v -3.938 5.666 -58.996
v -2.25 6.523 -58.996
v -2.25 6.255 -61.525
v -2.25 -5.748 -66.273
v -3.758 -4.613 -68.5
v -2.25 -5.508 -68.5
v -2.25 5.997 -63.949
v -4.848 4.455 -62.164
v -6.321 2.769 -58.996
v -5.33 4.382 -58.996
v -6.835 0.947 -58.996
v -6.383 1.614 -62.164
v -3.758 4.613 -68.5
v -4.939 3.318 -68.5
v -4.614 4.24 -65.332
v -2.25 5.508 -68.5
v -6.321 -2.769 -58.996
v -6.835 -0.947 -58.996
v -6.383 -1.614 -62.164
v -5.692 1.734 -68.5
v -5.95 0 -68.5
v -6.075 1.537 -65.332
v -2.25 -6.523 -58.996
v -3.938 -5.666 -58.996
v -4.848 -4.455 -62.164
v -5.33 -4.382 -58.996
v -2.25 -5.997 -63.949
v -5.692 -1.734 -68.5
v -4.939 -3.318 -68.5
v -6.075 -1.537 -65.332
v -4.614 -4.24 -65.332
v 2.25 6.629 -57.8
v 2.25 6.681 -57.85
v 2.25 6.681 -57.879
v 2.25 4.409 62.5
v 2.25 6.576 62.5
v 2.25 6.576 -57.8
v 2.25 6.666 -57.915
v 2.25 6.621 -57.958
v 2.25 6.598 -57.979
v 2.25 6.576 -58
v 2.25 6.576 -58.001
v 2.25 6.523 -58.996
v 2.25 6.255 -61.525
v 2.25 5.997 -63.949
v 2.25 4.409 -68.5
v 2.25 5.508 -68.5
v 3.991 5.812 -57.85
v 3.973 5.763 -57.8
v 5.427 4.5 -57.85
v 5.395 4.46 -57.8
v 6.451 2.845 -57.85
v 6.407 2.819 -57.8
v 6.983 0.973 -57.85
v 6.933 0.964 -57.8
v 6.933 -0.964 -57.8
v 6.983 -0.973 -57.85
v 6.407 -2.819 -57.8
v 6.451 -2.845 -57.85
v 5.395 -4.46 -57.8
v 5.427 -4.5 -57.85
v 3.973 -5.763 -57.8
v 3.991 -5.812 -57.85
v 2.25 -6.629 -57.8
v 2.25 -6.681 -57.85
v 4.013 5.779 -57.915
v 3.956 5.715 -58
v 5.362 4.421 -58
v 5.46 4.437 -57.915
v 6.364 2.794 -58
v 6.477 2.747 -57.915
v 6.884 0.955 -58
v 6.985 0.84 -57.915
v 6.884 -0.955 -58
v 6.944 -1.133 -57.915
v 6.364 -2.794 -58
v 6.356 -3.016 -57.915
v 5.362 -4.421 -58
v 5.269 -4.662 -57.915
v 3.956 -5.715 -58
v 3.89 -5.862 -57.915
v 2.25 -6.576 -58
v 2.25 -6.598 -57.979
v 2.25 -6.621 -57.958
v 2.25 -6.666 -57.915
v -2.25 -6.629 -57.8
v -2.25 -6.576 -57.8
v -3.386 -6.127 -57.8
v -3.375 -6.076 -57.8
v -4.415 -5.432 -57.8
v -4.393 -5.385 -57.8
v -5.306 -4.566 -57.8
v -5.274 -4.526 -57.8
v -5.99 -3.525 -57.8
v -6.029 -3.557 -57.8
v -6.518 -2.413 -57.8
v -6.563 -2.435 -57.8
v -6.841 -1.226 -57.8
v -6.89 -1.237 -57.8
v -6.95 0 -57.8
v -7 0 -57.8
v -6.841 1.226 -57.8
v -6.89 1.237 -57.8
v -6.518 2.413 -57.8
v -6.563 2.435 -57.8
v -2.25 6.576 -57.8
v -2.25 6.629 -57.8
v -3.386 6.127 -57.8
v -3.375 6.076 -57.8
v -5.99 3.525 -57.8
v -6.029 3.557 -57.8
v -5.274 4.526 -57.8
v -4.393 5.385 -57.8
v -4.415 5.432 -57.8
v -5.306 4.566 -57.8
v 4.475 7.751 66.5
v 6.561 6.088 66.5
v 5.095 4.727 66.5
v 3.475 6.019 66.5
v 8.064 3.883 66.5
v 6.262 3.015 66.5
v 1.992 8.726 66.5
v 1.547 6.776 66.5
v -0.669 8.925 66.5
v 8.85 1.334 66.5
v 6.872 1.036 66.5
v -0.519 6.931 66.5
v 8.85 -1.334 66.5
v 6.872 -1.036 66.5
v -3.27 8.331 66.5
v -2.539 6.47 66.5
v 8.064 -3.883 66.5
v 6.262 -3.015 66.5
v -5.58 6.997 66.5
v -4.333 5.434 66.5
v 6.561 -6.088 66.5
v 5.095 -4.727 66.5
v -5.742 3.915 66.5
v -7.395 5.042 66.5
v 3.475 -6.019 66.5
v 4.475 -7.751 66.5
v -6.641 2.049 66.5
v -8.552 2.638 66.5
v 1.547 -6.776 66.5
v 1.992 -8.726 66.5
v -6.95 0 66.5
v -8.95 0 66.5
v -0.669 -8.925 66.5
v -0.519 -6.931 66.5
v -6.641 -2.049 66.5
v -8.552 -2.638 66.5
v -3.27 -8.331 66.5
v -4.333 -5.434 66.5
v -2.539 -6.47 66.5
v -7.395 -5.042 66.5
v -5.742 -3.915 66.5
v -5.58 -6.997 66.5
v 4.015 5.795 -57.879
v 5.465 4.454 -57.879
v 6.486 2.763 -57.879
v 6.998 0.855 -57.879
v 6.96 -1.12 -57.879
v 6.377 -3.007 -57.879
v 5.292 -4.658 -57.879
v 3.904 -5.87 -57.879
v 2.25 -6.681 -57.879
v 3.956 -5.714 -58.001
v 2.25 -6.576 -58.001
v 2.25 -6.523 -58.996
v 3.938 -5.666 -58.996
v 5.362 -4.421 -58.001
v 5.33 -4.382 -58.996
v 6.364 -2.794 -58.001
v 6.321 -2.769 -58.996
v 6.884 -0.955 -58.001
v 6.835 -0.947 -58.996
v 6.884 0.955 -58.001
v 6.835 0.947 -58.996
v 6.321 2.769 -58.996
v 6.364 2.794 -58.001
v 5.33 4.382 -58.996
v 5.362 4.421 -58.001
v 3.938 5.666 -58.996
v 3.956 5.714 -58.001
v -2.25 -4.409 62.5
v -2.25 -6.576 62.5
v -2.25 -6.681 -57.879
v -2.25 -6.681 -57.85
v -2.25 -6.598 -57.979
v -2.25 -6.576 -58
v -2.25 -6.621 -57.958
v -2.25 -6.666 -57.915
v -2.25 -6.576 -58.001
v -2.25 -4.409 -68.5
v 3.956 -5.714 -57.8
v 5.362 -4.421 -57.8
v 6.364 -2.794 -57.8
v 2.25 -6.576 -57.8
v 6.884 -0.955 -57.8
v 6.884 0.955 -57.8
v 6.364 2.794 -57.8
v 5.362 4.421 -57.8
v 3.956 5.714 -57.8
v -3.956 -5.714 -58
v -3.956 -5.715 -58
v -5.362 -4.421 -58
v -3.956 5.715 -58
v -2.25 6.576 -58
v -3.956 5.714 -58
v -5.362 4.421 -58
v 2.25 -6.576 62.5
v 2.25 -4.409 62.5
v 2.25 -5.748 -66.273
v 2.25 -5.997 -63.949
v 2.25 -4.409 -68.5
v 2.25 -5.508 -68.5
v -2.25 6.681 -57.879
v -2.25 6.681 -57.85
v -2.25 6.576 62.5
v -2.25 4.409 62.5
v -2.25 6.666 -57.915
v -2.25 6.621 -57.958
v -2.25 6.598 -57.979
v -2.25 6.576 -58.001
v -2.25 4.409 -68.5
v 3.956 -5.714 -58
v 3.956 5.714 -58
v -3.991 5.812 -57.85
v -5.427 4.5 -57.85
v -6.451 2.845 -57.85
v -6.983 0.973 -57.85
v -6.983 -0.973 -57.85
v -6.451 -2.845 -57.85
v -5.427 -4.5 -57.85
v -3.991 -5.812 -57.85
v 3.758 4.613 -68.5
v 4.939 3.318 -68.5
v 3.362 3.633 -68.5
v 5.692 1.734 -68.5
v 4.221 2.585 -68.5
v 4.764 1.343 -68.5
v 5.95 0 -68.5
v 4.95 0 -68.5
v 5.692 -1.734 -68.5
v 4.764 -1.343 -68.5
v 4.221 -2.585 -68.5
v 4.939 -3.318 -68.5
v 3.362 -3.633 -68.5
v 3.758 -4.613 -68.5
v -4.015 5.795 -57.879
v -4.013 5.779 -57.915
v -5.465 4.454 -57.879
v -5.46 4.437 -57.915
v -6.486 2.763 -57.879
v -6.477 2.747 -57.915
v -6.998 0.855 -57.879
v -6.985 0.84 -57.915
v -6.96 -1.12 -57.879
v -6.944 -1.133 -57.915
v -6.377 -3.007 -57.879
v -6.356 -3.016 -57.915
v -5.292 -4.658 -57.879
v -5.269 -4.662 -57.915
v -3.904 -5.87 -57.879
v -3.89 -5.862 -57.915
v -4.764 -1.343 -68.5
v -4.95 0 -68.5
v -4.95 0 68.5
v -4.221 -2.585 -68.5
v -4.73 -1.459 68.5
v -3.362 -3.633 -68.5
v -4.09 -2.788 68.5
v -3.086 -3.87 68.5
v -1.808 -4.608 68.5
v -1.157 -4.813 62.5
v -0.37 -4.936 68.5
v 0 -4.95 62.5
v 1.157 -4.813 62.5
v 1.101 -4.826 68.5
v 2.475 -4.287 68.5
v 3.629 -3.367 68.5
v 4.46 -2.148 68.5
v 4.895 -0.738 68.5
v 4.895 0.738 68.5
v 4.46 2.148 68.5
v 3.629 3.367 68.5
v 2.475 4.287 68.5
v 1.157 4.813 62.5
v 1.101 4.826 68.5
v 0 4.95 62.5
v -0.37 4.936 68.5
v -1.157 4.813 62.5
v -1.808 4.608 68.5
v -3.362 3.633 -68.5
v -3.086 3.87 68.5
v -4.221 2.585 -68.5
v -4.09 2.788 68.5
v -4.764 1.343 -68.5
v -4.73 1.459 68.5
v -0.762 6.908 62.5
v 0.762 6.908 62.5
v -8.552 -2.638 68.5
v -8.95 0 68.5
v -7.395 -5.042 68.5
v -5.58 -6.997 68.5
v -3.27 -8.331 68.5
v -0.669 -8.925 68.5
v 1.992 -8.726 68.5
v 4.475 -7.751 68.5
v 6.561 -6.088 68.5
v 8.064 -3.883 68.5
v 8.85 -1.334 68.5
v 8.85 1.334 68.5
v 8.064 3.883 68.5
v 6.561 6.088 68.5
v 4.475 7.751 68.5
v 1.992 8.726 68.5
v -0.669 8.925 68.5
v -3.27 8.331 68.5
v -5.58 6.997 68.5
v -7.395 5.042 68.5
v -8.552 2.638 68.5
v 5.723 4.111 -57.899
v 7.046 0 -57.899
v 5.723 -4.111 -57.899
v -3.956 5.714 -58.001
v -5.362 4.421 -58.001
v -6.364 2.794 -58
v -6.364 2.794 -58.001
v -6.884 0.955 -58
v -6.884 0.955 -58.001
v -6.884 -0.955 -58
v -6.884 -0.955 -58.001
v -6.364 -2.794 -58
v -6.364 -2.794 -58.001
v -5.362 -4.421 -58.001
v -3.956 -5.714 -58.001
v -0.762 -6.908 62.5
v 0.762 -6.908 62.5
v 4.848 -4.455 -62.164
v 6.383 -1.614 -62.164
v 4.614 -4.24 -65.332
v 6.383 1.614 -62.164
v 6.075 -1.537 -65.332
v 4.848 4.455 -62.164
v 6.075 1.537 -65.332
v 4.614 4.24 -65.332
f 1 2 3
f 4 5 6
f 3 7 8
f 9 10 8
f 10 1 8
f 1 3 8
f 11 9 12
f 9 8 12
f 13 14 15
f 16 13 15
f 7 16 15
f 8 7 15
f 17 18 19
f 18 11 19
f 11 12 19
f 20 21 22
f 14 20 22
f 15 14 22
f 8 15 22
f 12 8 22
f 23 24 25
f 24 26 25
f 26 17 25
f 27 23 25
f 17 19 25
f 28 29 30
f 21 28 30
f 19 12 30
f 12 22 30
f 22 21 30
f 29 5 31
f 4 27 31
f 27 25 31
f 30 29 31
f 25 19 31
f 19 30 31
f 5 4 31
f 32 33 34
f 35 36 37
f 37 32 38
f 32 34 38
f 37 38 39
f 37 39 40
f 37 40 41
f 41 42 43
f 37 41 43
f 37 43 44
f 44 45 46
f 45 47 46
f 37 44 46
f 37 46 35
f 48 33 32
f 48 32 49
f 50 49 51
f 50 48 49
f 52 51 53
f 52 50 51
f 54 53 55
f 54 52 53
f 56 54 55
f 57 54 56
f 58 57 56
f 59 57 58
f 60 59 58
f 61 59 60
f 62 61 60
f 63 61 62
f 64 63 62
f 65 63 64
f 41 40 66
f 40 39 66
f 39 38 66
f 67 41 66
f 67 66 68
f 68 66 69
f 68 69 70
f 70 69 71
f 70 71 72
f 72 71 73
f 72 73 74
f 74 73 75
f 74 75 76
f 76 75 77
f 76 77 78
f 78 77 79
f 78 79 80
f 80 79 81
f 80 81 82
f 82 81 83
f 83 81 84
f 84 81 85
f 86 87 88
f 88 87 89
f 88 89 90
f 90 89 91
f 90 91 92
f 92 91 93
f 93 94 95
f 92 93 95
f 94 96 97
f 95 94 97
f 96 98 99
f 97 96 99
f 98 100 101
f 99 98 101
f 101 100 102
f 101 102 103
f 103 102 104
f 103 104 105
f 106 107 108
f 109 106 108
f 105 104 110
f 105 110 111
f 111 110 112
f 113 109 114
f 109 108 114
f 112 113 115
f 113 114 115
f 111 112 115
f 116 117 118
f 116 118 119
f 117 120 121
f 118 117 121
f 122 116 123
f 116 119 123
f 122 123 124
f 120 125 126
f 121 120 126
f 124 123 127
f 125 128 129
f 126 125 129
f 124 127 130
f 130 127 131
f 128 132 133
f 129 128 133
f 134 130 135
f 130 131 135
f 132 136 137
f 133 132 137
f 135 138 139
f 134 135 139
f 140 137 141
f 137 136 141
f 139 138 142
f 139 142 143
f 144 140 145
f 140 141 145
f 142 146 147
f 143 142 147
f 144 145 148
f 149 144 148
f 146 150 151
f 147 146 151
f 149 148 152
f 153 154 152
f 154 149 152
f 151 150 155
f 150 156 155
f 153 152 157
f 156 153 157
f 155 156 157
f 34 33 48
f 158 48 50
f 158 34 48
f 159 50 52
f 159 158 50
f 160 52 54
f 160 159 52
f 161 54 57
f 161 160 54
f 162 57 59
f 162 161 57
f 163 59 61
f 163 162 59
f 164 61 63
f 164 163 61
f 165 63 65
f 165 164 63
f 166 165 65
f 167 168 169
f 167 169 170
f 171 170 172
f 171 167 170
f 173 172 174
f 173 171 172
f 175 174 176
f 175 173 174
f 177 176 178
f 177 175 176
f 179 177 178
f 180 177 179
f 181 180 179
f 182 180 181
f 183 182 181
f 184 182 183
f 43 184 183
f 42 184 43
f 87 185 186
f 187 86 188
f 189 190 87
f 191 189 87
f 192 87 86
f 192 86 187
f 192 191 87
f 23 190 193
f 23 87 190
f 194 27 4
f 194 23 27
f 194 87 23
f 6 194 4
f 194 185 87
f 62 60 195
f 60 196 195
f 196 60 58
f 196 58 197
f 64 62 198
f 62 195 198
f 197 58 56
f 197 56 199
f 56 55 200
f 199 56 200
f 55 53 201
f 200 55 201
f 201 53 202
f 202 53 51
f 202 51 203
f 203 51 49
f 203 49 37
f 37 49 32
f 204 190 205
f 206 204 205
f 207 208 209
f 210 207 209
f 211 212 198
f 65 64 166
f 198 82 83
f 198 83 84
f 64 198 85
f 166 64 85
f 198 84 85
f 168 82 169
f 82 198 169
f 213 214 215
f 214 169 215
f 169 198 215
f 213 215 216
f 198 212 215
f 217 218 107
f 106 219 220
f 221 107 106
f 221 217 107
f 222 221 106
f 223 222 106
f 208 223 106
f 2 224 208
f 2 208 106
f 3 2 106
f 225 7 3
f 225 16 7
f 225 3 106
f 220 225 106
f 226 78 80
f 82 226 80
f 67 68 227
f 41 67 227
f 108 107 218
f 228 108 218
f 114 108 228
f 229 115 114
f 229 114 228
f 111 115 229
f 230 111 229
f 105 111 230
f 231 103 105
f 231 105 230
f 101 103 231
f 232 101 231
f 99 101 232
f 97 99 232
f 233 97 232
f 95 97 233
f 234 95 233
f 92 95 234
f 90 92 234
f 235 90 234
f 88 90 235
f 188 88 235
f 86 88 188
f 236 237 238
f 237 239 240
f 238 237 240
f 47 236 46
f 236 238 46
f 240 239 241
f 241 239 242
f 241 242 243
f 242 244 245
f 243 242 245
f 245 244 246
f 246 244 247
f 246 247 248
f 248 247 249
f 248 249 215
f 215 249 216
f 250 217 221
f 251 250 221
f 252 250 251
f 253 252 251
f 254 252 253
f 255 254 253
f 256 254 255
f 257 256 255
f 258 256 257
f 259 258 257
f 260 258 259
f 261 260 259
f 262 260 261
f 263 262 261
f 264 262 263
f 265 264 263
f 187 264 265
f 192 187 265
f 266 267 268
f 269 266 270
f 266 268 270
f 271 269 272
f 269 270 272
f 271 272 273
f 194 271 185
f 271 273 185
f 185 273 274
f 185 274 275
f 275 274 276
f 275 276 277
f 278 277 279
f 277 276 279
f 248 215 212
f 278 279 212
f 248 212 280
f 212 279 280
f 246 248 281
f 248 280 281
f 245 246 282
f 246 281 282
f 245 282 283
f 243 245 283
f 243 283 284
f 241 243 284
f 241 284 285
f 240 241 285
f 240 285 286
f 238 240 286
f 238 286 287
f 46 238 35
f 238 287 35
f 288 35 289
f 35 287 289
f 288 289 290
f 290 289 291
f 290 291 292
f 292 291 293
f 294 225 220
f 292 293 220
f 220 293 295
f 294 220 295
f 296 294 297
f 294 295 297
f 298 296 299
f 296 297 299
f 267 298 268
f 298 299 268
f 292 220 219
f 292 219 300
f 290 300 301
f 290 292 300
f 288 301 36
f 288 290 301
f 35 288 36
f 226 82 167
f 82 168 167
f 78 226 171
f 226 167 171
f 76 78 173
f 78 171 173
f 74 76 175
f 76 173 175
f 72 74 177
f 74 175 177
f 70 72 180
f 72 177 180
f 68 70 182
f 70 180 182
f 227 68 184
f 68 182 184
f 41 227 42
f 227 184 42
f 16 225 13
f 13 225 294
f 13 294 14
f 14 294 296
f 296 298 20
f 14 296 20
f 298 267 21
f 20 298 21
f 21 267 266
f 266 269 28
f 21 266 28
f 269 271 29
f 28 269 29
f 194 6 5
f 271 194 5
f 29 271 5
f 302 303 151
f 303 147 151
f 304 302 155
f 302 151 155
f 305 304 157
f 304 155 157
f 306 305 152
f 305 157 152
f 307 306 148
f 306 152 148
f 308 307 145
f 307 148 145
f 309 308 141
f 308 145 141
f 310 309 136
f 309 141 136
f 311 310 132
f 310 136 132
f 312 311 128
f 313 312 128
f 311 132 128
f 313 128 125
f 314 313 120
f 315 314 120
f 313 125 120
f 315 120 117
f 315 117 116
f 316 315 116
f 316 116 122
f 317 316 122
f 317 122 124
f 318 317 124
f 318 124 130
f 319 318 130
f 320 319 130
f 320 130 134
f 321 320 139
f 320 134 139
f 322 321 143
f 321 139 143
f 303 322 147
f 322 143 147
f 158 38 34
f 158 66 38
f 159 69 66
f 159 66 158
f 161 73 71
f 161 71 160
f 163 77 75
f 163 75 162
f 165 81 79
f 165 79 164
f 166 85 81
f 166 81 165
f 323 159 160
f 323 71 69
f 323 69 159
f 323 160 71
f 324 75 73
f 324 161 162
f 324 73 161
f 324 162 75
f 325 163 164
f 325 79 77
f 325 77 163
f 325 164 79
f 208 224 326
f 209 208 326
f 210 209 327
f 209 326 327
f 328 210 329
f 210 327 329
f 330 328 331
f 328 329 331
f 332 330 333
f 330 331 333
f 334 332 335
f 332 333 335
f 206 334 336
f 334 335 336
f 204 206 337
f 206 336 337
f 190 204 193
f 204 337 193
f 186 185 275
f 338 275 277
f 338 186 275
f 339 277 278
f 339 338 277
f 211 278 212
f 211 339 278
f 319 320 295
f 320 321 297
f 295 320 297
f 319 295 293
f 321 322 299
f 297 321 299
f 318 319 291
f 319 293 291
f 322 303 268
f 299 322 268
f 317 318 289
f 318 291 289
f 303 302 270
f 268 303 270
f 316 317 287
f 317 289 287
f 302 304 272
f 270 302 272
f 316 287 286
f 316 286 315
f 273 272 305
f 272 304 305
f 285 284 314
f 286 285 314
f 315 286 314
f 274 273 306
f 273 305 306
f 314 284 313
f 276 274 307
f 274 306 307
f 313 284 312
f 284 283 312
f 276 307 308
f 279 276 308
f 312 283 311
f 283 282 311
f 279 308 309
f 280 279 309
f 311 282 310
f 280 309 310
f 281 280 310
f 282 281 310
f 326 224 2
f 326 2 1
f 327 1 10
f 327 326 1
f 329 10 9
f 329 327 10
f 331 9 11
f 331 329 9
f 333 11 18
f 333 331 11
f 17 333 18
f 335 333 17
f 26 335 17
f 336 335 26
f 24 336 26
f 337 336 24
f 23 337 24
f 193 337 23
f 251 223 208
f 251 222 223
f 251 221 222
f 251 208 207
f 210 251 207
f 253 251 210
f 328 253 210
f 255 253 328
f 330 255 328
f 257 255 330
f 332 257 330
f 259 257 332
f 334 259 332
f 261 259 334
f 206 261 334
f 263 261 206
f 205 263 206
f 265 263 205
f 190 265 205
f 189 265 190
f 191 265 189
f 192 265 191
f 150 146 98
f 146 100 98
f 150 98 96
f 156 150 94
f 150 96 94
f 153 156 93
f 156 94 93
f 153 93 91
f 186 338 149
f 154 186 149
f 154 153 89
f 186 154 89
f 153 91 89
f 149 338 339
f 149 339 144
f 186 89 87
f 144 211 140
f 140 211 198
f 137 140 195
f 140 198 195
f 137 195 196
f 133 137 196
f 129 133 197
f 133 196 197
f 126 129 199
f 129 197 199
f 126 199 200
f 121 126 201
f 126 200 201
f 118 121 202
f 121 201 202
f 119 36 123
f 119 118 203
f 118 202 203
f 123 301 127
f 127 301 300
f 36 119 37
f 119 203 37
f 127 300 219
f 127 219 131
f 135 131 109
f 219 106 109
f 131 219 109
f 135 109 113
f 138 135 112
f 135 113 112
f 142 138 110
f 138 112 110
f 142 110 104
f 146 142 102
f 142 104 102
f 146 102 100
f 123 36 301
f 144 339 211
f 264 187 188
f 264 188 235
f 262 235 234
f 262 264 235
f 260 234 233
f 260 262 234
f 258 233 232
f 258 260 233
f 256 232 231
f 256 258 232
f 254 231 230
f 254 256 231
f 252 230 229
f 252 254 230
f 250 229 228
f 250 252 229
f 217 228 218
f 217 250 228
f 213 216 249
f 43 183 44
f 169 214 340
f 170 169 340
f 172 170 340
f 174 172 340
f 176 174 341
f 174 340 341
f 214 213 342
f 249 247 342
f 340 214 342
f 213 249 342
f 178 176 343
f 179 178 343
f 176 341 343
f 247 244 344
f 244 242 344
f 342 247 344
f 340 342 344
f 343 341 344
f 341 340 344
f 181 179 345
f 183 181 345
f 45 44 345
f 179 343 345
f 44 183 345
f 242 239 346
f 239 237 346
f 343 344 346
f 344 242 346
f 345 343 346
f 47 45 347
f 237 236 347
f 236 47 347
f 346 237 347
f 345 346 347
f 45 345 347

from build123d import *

# Parameters (mm, degrees)
CHAFL_N2_SIZE           = 10
CHAFL_N2_SIZE2          = 1
REDONDEO1_R             = 10
SALIENTE_EXTRUIR1_START = -10.5
CROQUIS3_R              = 7.05
CROQUIS3_R_2            = 6.95
SALIENTE_EXTRUIR1_DEPTH = 0.2
CROQUIS2_W              = 4.5
CROQUIS2_H              = 17.325126262
CORTAR_EXTRUIR1_DEPTH   = 131
CHAFL_N3_SIZE           = 0.1
REDONDEO2_R             = 0.05


# Some blends are built 0.0001 mm under size
with BuildPart() as part:
    # Croquis1 → Revolución1 (revolve)
    with BuildSketch(Plane.YZ, mode=Mode.PRIVATE) as revoluci_n1_sk:
        Polygon((4.95, -68.5), (4.95, 68.5), (8.95, 68.5), (8.95, 66.5), (6.95, 66.5), (6.95, -68.5), align=None)
    revolve(revoluci_n1_sk.sketch.rotate(Axis((0, 0, 0), (0, 0, 1)), 90), axis=Axis((0, 0, 0), (0, 0, 1)))

    # Chaflán2
    chafl_n2_edges = [part.edges().sort_by_distance(p)[0] for p in [
        (6.95, 0, -68.5),
    ]]
    chafl_n2_side = [part.faces().sort_by_distance(p)[0] for p in [
        (6.95, 0, -1),
    ]]
    chamfer(chafl_n2_edges, length=CHAFL_N2_SIZE, length2=CHAFL_N2_SIZE2, reference=chafl_n2_side[0])

    # Redondeo1
    # the kernel refuses this fillet: 10 mm, written as the material it takes off along each edge
    with BuildSketch(Plane(origin=(0, 0, -58.5), x_dir=(-1, 0, 0), z_dir=(0, 1, 0))) as redondeo1_piece_1:
        with BuildLine():
            CenterArc((6.95 - REDONDEO1_R, REDONDEO1_R * 0.0498756211209), REDONDEO1_R, 354.289406863, 5.710593137)
            Line((6.95 - REDONDEO1_R * 0.00496280979001, -REDONDEO1_R * 0.0496280979001), (6.95, 0))
            Line((6.95, 0), (6.95, REDONDEO1_R * 0.0498756211209))
        make_face()
    revolve(axis=Axis((0, 0, -58.5), (0, 0, 1)), mode=Mode.SUBTRACT)

    # Croquis3 → Saliente-Extruir1 (add)
    with BuildSketch(Plane(origin=(0, 0, -68.5), x_dir=(1, 0, 0), z_dir=(0, 0, -1)).offset(SALIENTE_EXTRUIR1_START)):
        with Locations(Location((0, 0, 0), (0, 0, 180))):
            Circle(CROQUIS3_R)
        with Locations(Location((0, 0, 0), (0, 0, 180))):
            Circle(CROQUIS3_R_2, mode=Mode.SUBTRACT)
    extrude(amount=-SALIENTE_EXTRUIR1_DEPTH)

    # Croquis2 → Cortar-Extruir1 (cut)
    with BuildSketch(Plane(origin=(0, 0, -68.5), x_dir=(1, 0, 0), z_dir=(0, 0, -1))):
        Rectangle(CROQUIS2_W, CROQUIS2_H)
    extrude(amount=-CORTAR_EXTRUIR1_DEPTH, mode=Mode.SUBTRACT)

    # Chaflán3
    chafl_n3_edges = [part.edges().sort_by_distance(p)[0] for p in [
        (7.05, 0, -58),
        (-7.05, 0, -58),
    ]]
    chamfer(chafl_n3_edges, length=CHAFL_N3_SIZE - 0.0001)  # a hair under: the kernel refuses the full size

    # Redondeo2
    redondeo2_edges = [part.edges().sort_by_distance(p)[0] for p in [
        (7.05, 0, -57.8),
        (7.05, 0, -57.9001),
        (-7.05, 0, -57.9001),
        (-7.05, 0, -57.8),
    ]]
    fillet(redondeo2_edges, radius=REDONDEO2_R)


solid = part.part
